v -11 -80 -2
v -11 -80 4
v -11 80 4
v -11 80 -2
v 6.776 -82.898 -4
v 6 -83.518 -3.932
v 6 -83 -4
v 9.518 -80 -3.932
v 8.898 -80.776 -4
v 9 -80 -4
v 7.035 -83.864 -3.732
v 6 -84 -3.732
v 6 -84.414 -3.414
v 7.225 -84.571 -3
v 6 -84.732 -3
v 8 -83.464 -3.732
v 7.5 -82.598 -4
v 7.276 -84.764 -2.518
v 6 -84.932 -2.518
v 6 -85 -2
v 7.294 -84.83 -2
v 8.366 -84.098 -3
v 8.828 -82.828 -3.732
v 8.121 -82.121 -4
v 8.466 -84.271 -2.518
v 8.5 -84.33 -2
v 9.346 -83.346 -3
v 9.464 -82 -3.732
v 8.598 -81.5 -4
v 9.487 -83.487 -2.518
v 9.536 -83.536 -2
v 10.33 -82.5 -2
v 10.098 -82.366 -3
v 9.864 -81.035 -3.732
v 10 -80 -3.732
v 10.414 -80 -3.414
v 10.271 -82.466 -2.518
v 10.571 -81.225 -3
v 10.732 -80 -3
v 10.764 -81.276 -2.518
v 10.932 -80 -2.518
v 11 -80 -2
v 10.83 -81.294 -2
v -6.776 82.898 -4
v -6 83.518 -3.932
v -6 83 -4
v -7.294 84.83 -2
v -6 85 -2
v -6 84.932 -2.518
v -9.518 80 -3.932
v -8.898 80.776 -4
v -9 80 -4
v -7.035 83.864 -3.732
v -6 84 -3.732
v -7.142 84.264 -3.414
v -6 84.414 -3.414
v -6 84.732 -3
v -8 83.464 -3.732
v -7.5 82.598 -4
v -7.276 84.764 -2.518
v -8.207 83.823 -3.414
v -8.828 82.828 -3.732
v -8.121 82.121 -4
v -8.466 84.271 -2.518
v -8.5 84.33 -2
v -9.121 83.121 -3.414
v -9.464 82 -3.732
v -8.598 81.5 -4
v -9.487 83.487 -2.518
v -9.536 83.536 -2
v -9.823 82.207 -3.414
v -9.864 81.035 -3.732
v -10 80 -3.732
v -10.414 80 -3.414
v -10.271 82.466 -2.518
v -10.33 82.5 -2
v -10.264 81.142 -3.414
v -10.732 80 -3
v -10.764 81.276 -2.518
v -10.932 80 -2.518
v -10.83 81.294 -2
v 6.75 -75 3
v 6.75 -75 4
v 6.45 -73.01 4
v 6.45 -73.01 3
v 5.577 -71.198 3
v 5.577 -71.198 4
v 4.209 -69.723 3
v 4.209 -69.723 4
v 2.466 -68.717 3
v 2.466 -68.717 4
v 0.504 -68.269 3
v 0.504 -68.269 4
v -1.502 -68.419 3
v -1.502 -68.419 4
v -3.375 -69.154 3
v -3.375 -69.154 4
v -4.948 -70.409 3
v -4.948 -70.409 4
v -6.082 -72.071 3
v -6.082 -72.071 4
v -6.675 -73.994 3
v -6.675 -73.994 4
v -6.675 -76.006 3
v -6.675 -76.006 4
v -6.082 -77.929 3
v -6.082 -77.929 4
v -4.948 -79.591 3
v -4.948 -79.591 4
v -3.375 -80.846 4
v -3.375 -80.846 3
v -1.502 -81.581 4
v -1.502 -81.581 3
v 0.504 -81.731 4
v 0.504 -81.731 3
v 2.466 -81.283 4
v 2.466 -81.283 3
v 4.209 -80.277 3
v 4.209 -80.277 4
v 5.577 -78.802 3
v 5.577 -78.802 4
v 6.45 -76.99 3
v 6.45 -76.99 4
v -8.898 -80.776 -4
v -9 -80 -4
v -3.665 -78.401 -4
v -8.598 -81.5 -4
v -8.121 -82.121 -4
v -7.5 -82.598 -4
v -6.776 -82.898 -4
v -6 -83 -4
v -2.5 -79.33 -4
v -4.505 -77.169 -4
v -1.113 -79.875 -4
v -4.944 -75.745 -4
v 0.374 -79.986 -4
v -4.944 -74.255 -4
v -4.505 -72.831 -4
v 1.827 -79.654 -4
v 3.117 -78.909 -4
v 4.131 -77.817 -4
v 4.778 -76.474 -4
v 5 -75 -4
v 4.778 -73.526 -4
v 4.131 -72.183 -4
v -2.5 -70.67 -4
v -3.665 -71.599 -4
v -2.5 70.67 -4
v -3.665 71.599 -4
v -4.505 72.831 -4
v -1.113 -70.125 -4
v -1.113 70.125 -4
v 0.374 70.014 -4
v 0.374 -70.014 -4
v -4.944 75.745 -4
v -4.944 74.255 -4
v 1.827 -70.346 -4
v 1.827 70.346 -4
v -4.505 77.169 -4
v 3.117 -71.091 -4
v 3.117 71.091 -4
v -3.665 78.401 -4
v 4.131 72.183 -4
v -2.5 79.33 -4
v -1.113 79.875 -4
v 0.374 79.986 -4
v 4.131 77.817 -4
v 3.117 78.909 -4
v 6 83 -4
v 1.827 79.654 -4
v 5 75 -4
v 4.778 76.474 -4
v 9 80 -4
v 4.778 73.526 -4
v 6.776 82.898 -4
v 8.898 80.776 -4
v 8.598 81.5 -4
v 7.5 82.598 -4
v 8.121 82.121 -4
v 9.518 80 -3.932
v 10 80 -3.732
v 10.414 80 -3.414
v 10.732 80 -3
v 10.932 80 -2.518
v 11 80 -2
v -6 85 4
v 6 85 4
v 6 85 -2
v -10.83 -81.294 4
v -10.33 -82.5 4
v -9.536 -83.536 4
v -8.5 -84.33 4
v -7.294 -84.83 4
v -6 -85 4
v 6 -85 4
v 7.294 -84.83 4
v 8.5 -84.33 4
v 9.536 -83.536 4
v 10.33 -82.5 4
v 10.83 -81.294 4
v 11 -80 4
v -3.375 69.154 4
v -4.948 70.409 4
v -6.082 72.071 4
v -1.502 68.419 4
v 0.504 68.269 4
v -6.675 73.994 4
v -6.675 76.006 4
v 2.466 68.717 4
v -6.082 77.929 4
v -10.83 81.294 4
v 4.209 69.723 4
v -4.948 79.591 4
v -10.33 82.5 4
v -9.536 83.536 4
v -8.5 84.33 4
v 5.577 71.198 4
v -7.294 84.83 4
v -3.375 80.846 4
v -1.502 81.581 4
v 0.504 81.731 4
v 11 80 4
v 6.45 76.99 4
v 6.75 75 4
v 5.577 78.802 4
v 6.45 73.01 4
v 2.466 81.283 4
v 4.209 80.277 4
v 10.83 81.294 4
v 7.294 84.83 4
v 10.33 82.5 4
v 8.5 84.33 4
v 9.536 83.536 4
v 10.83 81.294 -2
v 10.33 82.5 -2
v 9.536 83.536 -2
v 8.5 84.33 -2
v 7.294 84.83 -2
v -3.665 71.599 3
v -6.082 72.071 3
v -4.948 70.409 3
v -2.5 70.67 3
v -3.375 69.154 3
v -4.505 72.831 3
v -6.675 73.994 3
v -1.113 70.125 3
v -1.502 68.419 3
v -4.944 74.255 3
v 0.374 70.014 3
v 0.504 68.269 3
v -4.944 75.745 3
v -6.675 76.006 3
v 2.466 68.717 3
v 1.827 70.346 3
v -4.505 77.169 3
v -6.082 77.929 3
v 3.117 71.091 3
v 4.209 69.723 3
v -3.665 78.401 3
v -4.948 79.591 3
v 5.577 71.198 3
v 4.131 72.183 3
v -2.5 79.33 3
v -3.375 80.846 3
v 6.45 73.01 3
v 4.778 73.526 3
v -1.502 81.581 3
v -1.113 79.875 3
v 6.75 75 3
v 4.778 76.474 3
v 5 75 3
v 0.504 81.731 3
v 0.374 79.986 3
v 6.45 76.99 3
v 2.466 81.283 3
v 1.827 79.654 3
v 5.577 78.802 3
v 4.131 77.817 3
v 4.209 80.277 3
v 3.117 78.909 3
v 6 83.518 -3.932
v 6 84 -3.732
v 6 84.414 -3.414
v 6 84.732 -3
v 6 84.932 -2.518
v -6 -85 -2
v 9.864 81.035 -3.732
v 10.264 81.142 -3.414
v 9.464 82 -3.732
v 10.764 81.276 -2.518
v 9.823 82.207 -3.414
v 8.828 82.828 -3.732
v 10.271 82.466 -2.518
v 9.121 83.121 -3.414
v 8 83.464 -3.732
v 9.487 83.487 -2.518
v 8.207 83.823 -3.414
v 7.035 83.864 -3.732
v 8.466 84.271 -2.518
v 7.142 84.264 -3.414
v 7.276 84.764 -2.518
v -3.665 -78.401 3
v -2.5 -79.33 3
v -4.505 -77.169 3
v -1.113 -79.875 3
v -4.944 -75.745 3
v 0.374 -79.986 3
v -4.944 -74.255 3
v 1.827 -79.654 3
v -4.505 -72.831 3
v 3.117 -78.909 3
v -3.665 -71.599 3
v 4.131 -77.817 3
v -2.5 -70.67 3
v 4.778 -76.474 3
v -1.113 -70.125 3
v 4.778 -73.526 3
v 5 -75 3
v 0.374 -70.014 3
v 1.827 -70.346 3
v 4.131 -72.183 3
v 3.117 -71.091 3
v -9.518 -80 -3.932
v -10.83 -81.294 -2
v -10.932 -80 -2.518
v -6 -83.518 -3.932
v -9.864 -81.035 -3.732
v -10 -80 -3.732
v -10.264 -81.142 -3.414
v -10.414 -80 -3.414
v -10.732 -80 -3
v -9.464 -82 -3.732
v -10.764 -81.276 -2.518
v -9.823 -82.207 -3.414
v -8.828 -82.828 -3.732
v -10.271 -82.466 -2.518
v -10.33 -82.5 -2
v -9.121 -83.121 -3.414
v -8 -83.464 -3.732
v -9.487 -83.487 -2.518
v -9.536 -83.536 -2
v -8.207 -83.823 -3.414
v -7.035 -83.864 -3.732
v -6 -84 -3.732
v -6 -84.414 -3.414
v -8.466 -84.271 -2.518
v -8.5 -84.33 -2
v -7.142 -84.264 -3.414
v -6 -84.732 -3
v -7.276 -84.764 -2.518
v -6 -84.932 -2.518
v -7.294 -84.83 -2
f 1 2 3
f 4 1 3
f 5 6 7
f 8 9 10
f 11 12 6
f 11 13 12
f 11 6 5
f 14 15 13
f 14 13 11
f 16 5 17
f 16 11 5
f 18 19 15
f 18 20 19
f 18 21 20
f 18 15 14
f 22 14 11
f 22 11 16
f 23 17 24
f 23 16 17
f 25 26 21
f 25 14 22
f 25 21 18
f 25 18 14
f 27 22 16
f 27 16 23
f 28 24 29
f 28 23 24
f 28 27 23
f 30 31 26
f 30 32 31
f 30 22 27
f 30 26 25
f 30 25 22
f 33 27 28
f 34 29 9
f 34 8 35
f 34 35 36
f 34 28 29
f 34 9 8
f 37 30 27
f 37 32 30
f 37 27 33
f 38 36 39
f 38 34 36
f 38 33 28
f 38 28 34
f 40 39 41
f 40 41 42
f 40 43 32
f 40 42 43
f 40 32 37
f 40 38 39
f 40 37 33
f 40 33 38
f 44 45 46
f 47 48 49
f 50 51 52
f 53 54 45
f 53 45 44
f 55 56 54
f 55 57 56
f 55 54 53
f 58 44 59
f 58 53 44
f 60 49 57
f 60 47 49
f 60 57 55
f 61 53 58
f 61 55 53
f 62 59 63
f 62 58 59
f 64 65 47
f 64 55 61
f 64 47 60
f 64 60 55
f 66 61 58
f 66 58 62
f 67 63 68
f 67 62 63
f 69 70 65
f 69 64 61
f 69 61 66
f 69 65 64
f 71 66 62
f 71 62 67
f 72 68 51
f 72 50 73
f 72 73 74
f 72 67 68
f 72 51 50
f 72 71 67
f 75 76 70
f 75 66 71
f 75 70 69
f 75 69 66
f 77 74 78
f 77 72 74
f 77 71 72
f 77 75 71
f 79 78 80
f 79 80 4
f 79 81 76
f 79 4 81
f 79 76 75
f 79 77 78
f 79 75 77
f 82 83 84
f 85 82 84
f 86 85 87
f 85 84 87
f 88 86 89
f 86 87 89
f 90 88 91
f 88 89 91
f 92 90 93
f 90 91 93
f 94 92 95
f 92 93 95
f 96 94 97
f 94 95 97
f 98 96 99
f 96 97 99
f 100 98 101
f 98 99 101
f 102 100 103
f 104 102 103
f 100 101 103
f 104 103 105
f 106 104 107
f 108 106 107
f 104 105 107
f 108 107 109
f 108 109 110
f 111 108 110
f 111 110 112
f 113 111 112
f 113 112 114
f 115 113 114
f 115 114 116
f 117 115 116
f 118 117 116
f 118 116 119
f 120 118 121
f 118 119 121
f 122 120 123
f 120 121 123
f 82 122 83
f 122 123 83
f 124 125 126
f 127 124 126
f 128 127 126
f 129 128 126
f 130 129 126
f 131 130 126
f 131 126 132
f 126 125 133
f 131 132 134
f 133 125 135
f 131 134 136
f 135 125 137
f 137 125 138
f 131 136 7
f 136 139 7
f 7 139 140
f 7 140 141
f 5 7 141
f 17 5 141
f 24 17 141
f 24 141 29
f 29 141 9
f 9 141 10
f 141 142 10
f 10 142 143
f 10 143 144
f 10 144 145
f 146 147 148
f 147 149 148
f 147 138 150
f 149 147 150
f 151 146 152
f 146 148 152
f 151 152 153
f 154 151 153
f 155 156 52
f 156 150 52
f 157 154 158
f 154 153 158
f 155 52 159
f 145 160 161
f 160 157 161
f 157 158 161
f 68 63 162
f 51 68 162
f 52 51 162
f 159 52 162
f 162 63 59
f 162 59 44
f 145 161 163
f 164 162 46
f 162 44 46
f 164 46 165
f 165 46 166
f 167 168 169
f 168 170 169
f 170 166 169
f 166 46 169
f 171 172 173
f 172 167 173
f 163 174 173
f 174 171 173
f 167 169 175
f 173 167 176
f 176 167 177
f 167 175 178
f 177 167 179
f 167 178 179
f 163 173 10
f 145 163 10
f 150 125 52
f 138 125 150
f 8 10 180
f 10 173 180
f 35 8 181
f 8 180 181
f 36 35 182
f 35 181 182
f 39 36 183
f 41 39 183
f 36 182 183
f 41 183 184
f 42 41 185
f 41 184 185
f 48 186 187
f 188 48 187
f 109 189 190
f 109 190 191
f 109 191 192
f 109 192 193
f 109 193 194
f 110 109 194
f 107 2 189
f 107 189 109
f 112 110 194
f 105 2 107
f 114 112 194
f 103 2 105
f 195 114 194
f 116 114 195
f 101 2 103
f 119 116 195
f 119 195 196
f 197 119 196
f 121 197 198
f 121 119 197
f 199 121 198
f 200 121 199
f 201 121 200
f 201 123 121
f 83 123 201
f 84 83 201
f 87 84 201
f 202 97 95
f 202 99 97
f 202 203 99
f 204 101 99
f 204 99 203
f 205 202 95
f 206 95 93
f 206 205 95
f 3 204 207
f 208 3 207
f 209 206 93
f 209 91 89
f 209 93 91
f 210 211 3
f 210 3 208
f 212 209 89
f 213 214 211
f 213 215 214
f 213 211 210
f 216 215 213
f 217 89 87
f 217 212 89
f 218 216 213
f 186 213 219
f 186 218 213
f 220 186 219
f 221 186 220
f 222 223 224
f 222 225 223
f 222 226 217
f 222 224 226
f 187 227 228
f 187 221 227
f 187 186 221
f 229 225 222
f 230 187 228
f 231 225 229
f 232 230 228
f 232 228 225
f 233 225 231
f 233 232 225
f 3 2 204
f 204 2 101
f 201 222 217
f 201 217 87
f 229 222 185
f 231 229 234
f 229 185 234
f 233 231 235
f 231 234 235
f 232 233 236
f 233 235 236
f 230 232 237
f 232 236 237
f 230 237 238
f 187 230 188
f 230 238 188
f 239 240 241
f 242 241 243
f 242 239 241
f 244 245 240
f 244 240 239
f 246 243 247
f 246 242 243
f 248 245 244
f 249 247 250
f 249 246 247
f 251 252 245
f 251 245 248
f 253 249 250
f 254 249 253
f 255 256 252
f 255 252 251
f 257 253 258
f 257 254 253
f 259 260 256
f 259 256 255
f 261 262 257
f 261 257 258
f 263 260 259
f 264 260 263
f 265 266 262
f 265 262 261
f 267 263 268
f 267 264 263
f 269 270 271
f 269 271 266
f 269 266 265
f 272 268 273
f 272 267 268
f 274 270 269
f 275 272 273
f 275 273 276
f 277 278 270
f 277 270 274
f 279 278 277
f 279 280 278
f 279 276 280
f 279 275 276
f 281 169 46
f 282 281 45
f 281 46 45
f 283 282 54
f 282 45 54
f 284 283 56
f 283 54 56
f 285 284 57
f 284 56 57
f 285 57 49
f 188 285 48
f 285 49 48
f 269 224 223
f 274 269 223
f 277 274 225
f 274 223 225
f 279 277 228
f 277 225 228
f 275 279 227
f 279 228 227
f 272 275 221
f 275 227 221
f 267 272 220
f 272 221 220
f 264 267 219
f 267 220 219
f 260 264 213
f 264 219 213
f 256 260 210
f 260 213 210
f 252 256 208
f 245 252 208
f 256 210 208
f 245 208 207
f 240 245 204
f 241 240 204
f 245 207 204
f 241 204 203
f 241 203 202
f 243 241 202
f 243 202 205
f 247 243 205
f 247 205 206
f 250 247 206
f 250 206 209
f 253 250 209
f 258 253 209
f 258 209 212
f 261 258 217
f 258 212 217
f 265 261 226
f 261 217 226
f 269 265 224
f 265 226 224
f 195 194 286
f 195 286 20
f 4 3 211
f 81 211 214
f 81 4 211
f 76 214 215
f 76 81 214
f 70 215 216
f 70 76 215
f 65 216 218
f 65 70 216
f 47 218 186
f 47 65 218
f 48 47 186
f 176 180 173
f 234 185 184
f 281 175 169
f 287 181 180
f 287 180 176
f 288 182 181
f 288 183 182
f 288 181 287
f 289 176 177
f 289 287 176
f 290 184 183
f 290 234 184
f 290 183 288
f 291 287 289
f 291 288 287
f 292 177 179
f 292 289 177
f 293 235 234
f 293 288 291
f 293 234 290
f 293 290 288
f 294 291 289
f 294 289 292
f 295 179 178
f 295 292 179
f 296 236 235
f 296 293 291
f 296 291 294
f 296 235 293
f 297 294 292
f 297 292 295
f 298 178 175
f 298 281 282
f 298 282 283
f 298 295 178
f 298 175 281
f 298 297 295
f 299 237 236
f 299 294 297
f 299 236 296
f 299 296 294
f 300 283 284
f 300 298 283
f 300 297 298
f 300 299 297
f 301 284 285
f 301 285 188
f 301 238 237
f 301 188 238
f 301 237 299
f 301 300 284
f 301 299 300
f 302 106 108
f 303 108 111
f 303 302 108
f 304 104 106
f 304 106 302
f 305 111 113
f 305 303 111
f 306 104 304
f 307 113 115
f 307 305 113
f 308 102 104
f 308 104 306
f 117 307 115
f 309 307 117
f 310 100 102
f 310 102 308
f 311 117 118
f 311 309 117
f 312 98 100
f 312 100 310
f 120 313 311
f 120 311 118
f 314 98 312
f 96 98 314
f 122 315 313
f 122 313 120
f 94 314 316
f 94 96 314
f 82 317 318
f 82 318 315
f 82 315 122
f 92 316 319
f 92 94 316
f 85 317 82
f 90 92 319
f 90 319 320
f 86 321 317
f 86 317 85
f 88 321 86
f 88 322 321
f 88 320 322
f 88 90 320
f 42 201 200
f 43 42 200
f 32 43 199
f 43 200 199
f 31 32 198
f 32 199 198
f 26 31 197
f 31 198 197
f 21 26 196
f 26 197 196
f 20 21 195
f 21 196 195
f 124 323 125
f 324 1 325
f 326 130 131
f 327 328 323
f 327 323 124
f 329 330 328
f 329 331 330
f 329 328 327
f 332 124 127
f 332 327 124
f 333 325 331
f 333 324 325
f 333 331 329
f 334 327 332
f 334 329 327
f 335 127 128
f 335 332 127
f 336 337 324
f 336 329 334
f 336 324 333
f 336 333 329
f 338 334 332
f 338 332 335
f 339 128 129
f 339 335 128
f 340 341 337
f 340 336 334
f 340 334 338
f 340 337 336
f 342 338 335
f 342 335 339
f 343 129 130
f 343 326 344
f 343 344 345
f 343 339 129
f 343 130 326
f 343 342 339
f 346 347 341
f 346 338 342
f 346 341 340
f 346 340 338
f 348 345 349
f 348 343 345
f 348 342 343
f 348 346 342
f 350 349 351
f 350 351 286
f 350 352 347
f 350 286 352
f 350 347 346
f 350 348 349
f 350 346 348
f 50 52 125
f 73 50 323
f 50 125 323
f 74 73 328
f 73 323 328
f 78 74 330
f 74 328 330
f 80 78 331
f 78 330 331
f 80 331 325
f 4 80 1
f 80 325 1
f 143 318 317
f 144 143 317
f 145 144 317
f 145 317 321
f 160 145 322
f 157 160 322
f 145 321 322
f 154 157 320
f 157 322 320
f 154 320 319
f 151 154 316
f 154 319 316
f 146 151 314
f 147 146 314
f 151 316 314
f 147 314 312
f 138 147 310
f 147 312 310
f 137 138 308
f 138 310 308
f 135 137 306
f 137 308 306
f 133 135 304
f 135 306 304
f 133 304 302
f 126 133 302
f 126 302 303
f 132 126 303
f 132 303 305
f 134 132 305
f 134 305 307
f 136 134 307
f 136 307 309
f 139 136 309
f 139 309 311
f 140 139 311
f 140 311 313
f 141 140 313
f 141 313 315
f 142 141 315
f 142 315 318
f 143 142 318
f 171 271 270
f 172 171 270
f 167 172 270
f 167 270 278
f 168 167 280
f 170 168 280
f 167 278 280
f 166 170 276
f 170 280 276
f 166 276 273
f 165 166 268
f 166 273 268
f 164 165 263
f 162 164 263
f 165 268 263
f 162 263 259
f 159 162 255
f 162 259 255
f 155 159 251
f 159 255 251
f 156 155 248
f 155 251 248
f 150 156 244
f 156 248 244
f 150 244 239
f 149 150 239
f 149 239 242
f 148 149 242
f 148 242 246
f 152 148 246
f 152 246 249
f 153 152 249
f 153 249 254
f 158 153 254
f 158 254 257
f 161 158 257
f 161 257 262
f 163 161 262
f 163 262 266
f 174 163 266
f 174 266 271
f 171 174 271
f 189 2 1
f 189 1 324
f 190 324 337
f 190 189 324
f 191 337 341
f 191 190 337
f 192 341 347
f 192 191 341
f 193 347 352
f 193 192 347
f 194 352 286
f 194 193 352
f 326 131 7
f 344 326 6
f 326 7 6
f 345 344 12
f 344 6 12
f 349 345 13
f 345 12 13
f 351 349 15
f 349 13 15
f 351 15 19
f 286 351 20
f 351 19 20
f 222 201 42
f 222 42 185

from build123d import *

# Parameters (mm, degrees)
SKETCH1_W           = 22
SKETCH1_H           = 170
BOSS_EXTRUDE1_DEPTH = 4
FILLET1_R           = 5
FILLET2_R           = 2
SKETCH2_R           = 5
CUT_EXTRUDE1_DEPTH  = 87.081356867
SKETCH3_R           = 6.75
CUT_EXTRUDE2_DEPTH  = 1


with BuildPart() as part:
    # Sketch1 → Boss-Extrude1 (new, symmetric)
    with BuildSketch(Plane.XY):
        Rectangle(SKETCH1_W, SKETCH1_H)
    extrude(amount=BOSS_EXTRUDE1_DEPTH, both=True)

    # Fillet1
    fillet1_edges = [part.edges().sort_by_distance(p)[0] for p in [
        (11, -85, 0),
        (-11, -85, 0),
        (-11, 85, 0),
        (11, 85, 0),
    ]]
    fillet(fillet1_edges, radius=FILLET1_R)

    # Fillet2
    fillet2_edges = [part.edges().sort_by_distance(p)[0] for p in [
        (11, 0, -4),
        (0, -85, -4),
        (-11, 0, -4),
        (0, 85, -4),
        (9.535533906, 83.535533906, -4),
        (-9.535533906, 83.535533906, -4),
        (-9.535533906, -83.535533906, -4),
        (9.535533906, -83.535533906, -4),
    ]]
    fillet(fillet2_edges, radius=FILLET2_R)

    # Sketch2 → Cut-Extrude1 (cut, through all)
    with BuildSketch(Plane.XY.offset(4)):
        with Locations((0, 75)):
            Circle(SKETCH2_R)
        with Locations((0, -75)):
            Circle(SKETCH2_R)
    extrude(amount=-CUT_EXTRUDE1_DEPTH, mode=Mode.SUBTRACT)

    # Sketch3 → Cut-Extrude2 (cut)
    with BuildSketch(Plane.XY.offset(4)):
        with Locations((0, 75)):
            Circle(SKETCH3_R)
        with Locations((0, -75)):
            Circle(SKETCH3_R)
    extrude(amount=-CUT_EXTRUDE2_DEPTH, mode=Mode.SUBTRACT)


solid = part.part
